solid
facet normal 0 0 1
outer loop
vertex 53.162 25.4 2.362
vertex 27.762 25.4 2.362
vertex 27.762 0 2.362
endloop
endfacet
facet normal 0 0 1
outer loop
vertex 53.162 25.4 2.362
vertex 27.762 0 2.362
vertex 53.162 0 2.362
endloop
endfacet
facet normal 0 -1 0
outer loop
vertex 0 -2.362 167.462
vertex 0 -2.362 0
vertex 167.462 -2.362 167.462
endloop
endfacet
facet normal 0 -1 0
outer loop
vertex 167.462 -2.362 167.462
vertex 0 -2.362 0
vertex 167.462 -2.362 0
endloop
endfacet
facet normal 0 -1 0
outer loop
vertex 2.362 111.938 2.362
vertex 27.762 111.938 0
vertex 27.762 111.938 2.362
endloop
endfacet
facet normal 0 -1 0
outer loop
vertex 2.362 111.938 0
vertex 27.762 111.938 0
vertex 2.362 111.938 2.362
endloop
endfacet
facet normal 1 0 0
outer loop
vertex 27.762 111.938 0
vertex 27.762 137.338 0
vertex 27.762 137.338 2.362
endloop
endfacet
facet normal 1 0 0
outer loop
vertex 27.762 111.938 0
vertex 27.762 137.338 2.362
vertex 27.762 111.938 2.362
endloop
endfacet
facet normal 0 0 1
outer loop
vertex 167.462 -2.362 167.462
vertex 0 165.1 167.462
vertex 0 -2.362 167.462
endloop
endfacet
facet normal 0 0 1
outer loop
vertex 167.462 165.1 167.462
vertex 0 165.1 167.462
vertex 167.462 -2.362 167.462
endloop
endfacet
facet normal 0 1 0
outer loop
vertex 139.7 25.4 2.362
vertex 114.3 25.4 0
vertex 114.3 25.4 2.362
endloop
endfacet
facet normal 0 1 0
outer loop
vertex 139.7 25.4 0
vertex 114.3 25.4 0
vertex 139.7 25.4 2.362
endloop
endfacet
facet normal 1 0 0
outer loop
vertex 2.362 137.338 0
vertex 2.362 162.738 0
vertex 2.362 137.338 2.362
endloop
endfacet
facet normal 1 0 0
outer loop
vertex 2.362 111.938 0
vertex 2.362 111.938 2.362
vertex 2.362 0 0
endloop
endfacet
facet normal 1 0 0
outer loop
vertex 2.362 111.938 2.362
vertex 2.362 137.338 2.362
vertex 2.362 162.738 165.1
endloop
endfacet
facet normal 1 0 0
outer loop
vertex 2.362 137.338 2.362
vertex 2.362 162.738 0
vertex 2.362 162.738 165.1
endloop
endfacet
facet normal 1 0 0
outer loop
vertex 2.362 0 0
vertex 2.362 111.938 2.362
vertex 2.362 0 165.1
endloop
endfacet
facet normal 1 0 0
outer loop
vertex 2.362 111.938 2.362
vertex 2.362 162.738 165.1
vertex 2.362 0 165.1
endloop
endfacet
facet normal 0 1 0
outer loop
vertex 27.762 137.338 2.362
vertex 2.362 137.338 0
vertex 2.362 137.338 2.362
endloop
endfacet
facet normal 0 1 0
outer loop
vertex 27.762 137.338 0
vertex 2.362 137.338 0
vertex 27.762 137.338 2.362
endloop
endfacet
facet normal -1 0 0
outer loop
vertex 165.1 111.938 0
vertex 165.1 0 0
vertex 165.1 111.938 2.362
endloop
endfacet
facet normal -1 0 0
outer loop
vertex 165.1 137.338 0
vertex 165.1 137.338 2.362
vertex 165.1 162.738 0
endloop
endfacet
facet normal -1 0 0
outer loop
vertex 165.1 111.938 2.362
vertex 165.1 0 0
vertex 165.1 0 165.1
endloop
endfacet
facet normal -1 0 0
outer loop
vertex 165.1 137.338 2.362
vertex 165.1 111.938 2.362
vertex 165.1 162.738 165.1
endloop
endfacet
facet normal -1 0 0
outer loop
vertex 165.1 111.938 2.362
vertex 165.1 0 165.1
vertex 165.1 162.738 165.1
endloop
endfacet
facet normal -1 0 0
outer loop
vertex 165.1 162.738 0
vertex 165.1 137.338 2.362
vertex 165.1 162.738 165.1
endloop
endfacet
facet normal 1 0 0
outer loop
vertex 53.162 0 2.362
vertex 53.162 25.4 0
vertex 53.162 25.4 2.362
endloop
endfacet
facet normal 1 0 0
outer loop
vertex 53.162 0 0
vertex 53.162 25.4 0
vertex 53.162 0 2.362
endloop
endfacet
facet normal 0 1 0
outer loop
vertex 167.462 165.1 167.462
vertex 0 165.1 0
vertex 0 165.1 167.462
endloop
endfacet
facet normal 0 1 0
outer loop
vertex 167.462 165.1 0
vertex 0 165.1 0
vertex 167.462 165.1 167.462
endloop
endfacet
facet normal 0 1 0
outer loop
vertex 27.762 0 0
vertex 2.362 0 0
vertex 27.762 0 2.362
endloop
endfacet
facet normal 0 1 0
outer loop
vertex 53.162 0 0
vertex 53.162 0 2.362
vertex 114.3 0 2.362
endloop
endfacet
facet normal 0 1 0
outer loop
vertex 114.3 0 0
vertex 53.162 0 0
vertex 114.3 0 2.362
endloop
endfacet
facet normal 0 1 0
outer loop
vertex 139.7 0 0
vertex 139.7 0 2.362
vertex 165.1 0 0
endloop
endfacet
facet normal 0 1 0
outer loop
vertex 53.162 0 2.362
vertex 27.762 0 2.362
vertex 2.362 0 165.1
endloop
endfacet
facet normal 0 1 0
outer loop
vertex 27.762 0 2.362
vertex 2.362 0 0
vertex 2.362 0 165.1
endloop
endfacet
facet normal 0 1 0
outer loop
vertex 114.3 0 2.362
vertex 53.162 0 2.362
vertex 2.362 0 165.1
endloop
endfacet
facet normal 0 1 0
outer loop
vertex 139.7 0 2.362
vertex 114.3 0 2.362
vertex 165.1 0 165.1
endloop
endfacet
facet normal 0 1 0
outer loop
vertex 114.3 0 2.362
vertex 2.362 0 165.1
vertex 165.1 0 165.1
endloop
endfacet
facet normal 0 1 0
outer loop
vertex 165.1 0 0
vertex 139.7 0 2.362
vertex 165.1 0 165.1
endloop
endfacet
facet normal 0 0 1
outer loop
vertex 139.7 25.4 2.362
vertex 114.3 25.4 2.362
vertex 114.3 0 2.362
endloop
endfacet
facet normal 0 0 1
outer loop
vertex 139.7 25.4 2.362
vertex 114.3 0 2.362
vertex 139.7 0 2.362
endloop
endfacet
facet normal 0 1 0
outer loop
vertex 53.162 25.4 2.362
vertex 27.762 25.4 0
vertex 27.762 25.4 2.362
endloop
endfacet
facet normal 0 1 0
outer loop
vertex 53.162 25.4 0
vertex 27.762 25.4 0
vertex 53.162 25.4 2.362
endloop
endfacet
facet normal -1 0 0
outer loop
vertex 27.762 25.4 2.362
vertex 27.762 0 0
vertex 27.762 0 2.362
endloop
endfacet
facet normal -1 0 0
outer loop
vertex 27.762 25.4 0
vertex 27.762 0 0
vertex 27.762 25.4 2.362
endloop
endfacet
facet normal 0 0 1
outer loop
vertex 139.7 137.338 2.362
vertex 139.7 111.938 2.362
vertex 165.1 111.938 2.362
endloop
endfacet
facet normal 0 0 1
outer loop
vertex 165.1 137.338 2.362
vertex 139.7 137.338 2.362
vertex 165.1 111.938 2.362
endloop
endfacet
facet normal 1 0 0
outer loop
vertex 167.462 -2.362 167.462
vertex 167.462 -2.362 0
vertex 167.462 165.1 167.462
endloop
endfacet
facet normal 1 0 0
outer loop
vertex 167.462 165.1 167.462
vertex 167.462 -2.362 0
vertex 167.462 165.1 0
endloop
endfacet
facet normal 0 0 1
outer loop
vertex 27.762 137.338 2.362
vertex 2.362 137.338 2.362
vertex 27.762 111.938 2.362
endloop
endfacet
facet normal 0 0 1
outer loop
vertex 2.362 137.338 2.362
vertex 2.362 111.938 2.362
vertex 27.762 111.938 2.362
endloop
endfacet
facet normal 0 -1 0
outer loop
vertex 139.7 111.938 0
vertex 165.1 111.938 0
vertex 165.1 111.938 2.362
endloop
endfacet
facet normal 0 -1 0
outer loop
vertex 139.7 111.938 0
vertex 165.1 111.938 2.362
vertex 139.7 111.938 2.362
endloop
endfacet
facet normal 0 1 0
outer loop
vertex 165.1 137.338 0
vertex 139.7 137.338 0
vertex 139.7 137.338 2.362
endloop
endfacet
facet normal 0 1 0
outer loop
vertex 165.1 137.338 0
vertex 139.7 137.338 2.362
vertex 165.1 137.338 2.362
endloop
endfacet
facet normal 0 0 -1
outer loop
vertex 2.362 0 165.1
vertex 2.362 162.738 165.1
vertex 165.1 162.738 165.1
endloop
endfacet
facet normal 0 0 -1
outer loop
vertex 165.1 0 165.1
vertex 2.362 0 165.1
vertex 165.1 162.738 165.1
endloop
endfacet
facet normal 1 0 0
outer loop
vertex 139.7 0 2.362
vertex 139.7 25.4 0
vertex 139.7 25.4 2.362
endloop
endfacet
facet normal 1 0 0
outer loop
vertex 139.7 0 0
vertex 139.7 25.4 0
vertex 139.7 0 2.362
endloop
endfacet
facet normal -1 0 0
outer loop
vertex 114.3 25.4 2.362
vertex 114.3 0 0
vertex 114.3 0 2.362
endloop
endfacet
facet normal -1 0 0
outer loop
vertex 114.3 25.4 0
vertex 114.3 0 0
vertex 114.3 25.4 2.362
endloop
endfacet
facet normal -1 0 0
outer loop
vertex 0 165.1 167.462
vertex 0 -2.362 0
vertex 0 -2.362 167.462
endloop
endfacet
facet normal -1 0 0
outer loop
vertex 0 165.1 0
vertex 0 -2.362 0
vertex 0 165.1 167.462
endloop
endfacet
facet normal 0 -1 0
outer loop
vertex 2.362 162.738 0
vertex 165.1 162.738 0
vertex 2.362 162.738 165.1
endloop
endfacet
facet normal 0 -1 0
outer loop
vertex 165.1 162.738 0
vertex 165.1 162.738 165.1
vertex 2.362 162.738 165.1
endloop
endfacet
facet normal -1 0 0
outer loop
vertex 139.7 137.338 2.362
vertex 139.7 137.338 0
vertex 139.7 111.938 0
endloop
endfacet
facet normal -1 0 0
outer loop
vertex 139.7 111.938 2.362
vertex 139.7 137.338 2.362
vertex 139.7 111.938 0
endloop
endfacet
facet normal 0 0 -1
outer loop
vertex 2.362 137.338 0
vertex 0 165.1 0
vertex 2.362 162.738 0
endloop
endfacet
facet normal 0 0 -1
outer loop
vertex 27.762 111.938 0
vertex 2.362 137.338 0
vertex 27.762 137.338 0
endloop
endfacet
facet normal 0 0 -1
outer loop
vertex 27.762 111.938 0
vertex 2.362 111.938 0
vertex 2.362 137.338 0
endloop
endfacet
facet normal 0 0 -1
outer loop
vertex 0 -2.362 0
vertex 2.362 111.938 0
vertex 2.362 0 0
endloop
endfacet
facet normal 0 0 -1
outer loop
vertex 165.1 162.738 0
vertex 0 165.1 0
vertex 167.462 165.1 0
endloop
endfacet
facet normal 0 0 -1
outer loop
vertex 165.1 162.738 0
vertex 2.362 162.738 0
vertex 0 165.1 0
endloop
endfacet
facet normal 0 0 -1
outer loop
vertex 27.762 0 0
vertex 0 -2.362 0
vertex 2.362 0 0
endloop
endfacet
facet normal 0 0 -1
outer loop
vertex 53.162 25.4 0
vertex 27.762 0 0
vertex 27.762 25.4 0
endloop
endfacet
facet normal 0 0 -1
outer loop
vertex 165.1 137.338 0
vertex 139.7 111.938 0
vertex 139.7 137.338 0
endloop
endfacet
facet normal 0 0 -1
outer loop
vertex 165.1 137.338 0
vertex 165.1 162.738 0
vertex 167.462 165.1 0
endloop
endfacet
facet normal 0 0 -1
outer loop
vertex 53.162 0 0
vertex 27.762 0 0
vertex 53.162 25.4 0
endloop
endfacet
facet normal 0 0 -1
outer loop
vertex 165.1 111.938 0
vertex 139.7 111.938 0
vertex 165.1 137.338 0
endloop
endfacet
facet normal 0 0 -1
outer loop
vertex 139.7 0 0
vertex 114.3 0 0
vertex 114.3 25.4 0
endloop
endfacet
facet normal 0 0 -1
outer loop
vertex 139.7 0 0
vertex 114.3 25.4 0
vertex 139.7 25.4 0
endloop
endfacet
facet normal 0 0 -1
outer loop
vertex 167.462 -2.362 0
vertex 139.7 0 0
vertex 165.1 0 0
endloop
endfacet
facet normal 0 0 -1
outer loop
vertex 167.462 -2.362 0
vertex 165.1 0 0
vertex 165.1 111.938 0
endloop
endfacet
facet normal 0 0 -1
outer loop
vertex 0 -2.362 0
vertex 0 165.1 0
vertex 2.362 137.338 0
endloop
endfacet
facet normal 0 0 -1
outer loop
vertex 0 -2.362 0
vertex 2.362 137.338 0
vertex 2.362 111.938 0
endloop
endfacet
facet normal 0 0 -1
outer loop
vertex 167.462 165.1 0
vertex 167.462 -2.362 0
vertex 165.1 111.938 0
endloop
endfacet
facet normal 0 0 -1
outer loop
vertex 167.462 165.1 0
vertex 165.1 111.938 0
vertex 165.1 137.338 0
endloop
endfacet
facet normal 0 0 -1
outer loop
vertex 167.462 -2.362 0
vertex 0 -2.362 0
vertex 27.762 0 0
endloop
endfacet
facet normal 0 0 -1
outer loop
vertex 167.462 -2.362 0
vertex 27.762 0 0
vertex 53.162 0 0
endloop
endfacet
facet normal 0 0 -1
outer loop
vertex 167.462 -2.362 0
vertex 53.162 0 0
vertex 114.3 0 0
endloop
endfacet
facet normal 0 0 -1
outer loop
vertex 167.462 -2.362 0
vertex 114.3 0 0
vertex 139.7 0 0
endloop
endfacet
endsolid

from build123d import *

# Parameters (mm, degrees)
F0_W      = 165.1
F0_H      = 165.1
F1_DEPTH  = 2.3622
F2_W      = 2.3622
F2_H      = 165.1
F2_W_2    = 162.7378
F3_DEPTH  = 2.3622
F4_W      = 162.7378
F4_H      = 165.1
F4_W_2    = 2.3622
F5_DEPTH  = 2.3622
F6_W      = 162.7378
F6_H      = 165.1
F6_W_2    = 2.3622
F7_DEPTH  = 2.3622
F8_W      = 167.4622
F8_H      = 167.4622
F8_W_2    = 162.7378
F8_H_2    = 162.7378
F9_DEPTH  = 2.3622
F10_W     = 25.4
F10_H     = 25.4
F10_H_2   = 2.3622
F10_W_2   = 2.3622
F11_DEPTH = 2.3622


with BuildPart() as f1:
    # F0 (on Front) → F1 (new body)
    with BuildSketch(Plane.XZ):
        with Locations((82.55, 82.55)):
            Rectangle(F0_W, F0_H)
    extrude(amount=F1_DEPTH)

    # F2 (on face) → F3 (join)
    with BuildSketch(Plane.YZ.offset(165.1)):
        with Locations((-1.1811, 82.55)):
            Rectangle(F2_W, F2_H)
        with Locations((81.3689, 82.55)):
            Rectangle(F2_W_2, F2_H)
    extrude(amount=F3_DEPTH)

    # F4 (on face) → F5 (join)
    with BuildSketch(Plane(origin=(0, 162.7378, 0), x_dir=(-1, 0, 0), z_dir=(0, 1, 0))):
        with Locations((-83.7311, 82.55)):
            Rectangle(F4_W, F4_H)
        with Locations((-166.2811, 82.55)):
            Rectangle(F4_W_2, F4_H)
    extrude(amount=F5_DEPTH)

    # F6 (on face) → F7 (join)
    with BuildSketch(Plane(origin=(2.3622, 0, 0), x_dir=(0, -1, 0), z_dir=(-1, 0, 0))):
        with Locations((-81.3689, 82.55)):
            Rectangle(F6_W, F6_H)
        with Locations((-163.9189, 82.55)):
            Rectangle(F6_W_2, F6_H)
    extrude(amount=F7_DEPTH)

    # F8 (on face) → F9 (join)
    with BuildSketch(Plane.XY.offset(165.1)):
        with Locations((83.7311, 81.3689)):
            Rectangle(F8_W, F8_H)
        with Locations((83.7311, 81.3689)):
            Rectangle(F8_W_2, F8_H_2, mode=Mode.SUBTRACT)
        with Locations((83.7311, 81.3689)):
            Rectangle(F8_W_2, F8_H_2)
    extrude(amount=F9_DEPTH)

    # F10 (on face) → F11 (join)
    with BuildSketch(Plane(origin=(0, 0, 0), x_dir=(1, 0, 0), z_dir=(0, 0, -1))):
        with Locations((127, -12.7)):
            Rectangle(F10_W, F10_H)
        with Locations((152.4, -124.6378)):
            Rectangle(F10_W, F10_H)
        with Locations((40.4622, -12.7)):
            Rectangle(F10_W, F10_H)
        with Locations((15.0622, -124.6378)):
            Rectangle(F10_W, F10_H)
        with Locations((40.4622, 1.1811)):
            Rectangle(F10_W, F10_H_2)
        with Locations((127, 1.1811)):
            Rectangle(F10_W, F10_H_2)
        with Locations((1.1811, -124.6378)):
            Rectangle(F10_W_2, F10_H)
        with Locations((166.2811, -124.6378)):
            Rectangle(F10_W_2, F10_H)
    extrude(amount=-F11_DEPTH)


solid = f1.part
